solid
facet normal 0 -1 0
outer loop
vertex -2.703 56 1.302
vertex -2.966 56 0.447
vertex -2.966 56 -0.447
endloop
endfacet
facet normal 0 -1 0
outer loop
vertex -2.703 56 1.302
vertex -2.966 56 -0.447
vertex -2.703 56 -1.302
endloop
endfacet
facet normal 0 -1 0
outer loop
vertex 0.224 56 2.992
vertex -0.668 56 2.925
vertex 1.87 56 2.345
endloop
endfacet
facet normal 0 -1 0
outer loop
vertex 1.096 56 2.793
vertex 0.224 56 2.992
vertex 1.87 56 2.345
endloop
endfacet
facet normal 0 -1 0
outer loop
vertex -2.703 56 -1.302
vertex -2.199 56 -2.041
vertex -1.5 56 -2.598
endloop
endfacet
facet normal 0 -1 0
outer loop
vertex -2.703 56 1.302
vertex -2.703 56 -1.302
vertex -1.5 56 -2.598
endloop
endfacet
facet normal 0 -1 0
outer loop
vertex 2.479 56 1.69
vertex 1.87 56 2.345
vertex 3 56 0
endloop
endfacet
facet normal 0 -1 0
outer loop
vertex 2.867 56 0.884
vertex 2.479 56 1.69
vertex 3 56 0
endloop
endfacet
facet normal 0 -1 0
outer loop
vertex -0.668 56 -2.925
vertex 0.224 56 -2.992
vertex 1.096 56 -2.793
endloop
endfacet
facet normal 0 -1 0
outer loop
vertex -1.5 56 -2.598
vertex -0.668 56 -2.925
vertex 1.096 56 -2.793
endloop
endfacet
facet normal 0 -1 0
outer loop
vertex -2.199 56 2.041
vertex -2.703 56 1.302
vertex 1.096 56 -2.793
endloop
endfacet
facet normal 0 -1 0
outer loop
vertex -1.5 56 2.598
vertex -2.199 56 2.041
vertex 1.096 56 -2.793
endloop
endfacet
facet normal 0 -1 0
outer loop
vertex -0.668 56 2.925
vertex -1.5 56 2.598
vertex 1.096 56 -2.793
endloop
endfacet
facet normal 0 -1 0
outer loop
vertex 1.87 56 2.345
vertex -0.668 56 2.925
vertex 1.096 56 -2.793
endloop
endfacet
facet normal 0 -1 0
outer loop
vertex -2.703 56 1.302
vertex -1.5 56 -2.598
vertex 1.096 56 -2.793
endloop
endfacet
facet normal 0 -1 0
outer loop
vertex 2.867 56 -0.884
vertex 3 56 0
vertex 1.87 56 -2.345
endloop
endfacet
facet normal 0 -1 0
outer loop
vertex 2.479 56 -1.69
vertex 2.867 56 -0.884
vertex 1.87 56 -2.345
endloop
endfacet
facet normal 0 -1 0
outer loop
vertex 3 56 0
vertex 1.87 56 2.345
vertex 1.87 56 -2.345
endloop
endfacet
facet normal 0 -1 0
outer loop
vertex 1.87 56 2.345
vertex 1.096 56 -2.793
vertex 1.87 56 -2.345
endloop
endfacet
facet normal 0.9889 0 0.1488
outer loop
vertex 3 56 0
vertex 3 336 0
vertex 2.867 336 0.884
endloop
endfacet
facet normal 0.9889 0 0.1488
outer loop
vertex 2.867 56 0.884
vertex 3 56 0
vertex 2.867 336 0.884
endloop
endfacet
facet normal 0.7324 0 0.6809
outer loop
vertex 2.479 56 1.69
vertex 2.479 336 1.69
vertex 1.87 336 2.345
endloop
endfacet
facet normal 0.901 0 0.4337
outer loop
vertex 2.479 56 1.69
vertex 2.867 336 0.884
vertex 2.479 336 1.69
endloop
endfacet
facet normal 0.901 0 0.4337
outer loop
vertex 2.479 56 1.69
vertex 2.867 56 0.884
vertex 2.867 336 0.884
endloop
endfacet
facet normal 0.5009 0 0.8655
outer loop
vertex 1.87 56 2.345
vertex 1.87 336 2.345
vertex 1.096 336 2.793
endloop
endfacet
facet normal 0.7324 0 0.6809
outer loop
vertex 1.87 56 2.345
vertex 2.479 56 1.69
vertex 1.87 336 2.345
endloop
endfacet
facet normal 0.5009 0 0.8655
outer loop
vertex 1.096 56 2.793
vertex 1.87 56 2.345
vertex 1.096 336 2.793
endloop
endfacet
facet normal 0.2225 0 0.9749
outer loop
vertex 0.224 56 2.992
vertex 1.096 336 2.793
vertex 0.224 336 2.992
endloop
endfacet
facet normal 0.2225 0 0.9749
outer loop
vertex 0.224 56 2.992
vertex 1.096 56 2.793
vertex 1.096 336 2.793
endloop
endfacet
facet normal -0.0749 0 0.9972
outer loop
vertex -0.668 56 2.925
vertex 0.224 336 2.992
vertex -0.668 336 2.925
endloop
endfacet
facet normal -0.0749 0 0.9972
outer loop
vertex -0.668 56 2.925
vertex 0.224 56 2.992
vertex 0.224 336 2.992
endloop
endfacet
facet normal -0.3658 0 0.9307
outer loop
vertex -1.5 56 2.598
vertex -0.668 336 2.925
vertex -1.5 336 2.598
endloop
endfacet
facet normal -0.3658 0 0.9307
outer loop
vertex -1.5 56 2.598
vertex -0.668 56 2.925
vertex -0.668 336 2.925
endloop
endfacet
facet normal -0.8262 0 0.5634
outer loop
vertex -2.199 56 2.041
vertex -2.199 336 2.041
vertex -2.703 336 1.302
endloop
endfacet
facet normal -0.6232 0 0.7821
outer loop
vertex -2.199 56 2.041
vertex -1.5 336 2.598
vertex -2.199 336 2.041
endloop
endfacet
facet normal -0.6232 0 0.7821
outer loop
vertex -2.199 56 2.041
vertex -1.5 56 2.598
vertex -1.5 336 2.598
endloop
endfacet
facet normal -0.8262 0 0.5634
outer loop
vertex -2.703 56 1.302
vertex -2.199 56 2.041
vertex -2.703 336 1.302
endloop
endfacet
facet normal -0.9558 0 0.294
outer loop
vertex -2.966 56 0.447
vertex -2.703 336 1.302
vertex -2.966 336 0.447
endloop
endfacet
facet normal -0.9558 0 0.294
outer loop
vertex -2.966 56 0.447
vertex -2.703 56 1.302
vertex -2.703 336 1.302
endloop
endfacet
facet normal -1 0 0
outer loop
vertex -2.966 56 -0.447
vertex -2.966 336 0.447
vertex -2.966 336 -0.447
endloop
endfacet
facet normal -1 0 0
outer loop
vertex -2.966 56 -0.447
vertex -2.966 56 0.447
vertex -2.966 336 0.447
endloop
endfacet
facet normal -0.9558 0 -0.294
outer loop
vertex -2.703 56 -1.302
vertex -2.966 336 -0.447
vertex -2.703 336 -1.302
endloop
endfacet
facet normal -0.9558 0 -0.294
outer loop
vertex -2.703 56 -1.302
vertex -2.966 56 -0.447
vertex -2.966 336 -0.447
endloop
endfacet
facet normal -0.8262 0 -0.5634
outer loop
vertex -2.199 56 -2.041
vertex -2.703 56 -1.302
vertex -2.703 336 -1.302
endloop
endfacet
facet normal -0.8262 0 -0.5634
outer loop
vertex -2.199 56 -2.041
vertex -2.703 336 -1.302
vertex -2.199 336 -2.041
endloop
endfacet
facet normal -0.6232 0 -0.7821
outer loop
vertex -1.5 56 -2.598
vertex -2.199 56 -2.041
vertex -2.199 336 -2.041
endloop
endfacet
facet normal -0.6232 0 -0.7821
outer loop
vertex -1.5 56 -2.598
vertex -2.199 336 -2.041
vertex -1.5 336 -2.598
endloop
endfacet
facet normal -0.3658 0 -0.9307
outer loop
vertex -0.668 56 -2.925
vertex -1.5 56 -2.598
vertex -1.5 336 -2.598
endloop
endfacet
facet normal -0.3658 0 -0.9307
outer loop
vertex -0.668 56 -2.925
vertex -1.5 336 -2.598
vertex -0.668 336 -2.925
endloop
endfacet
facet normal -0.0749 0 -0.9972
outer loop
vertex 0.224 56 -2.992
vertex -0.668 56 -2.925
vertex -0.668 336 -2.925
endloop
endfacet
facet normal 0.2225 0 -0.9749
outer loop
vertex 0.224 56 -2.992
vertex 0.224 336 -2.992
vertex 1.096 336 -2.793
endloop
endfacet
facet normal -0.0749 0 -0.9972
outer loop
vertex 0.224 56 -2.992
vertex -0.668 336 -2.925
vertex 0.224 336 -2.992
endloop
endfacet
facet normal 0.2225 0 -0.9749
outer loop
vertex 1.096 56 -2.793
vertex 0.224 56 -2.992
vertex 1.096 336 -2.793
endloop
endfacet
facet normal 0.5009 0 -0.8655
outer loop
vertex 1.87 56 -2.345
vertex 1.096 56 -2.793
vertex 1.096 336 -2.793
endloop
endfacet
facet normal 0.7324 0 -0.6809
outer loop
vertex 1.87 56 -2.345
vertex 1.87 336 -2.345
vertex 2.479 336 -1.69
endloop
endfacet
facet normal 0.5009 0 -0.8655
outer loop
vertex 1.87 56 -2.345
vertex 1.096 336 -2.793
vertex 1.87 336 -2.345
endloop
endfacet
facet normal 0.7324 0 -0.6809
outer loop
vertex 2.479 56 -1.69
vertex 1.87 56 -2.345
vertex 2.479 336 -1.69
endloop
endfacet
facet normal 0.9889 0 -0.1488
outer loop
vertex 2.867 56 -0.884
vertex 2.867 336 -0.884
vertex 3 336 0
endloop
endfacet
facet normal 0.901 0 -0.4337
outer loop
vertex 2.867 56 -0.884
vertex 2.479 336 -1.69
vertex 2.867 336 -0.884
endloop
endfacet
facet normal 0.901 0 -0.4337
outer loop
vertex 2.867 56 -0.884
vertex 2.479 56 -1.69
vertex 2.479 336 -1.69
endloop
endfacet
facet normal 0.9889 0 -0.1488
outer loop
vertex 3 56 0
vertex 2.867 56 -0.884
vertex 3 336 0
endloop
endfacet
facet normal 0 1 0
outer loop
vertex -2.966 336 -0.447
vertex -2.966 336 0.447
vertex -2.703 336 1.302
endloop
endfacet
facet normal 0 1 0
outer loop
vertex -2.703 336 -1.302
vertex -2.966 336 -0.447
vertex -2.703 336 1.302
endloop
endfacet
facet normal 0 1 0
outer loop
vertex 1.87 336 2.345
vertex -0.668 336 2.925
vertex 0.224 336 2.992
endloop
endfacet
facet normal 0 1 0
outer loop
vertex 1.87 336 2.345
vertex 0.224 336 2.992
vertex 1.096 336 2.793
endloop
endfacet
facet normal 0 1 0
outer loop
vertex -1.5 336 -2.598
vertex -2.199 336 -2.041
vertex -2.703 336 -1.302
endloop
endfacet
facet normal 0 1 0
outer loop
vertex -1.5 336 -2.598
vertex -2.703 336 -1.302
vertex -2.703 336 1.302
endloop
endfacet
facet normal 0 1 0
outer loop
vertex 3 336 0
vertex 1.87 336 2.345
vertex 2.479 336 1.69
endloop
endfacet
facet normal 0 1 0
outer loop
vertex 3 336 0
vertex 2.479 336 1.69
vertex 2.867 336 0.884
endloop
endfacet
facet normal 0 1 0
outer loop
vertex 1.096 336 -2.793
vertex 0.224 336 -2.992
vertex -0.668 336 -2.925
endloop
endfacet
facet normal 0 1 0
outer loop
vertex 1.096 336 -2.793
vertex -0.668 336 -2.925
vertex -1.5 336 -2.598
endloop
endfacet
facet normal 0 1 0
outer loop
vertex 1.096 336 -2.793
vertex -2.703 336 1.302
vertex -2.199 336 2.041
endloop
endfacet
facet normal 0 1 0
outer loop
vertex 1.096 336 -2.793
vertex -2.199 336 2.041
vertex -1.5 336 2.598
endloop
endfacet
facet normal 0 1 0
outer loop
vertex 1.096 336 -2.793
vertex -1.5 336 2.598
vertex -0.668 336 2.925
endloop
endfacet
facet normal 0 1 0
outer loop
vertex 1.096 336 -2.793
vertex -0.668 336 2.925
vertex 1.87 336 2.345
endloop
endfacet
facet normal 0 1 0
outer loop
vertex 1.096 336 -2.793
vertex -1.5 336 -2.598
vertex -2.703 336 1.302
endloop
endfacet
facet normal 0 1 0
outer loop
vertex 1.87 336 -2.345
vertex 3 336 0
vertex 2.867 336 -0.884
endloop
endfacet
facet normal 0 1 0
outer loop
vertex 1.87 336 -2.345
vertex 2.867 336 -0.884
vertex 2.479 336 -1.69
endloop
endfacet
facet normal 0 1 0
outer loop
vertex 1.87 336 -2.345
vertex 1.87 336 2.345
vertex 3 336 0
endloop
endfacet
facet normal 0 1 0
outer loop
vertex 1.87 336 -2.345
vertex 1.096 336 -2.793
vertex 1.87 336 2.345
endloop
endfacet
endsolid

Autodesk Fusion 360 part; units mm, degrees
sketch "Sketch1" plane through (0, 0, 0) normal (0, 1, 0) x (1, 0, 0)
  circle A0 centre (0, 0) radius 3
  dimension "d1" = 6
extrude "Extrude1" add sketch "Sketch1" along normal blind 336
extrude "Extrude2" cut 1 faces at (-1.1591, 0, -0.5829) along direction (0, 1, 0) blind 50
extrude "Extrude3" cut 1 faces at (-1.1591, 50, -0.5829) along direction (0, 1, 0) blind 6
